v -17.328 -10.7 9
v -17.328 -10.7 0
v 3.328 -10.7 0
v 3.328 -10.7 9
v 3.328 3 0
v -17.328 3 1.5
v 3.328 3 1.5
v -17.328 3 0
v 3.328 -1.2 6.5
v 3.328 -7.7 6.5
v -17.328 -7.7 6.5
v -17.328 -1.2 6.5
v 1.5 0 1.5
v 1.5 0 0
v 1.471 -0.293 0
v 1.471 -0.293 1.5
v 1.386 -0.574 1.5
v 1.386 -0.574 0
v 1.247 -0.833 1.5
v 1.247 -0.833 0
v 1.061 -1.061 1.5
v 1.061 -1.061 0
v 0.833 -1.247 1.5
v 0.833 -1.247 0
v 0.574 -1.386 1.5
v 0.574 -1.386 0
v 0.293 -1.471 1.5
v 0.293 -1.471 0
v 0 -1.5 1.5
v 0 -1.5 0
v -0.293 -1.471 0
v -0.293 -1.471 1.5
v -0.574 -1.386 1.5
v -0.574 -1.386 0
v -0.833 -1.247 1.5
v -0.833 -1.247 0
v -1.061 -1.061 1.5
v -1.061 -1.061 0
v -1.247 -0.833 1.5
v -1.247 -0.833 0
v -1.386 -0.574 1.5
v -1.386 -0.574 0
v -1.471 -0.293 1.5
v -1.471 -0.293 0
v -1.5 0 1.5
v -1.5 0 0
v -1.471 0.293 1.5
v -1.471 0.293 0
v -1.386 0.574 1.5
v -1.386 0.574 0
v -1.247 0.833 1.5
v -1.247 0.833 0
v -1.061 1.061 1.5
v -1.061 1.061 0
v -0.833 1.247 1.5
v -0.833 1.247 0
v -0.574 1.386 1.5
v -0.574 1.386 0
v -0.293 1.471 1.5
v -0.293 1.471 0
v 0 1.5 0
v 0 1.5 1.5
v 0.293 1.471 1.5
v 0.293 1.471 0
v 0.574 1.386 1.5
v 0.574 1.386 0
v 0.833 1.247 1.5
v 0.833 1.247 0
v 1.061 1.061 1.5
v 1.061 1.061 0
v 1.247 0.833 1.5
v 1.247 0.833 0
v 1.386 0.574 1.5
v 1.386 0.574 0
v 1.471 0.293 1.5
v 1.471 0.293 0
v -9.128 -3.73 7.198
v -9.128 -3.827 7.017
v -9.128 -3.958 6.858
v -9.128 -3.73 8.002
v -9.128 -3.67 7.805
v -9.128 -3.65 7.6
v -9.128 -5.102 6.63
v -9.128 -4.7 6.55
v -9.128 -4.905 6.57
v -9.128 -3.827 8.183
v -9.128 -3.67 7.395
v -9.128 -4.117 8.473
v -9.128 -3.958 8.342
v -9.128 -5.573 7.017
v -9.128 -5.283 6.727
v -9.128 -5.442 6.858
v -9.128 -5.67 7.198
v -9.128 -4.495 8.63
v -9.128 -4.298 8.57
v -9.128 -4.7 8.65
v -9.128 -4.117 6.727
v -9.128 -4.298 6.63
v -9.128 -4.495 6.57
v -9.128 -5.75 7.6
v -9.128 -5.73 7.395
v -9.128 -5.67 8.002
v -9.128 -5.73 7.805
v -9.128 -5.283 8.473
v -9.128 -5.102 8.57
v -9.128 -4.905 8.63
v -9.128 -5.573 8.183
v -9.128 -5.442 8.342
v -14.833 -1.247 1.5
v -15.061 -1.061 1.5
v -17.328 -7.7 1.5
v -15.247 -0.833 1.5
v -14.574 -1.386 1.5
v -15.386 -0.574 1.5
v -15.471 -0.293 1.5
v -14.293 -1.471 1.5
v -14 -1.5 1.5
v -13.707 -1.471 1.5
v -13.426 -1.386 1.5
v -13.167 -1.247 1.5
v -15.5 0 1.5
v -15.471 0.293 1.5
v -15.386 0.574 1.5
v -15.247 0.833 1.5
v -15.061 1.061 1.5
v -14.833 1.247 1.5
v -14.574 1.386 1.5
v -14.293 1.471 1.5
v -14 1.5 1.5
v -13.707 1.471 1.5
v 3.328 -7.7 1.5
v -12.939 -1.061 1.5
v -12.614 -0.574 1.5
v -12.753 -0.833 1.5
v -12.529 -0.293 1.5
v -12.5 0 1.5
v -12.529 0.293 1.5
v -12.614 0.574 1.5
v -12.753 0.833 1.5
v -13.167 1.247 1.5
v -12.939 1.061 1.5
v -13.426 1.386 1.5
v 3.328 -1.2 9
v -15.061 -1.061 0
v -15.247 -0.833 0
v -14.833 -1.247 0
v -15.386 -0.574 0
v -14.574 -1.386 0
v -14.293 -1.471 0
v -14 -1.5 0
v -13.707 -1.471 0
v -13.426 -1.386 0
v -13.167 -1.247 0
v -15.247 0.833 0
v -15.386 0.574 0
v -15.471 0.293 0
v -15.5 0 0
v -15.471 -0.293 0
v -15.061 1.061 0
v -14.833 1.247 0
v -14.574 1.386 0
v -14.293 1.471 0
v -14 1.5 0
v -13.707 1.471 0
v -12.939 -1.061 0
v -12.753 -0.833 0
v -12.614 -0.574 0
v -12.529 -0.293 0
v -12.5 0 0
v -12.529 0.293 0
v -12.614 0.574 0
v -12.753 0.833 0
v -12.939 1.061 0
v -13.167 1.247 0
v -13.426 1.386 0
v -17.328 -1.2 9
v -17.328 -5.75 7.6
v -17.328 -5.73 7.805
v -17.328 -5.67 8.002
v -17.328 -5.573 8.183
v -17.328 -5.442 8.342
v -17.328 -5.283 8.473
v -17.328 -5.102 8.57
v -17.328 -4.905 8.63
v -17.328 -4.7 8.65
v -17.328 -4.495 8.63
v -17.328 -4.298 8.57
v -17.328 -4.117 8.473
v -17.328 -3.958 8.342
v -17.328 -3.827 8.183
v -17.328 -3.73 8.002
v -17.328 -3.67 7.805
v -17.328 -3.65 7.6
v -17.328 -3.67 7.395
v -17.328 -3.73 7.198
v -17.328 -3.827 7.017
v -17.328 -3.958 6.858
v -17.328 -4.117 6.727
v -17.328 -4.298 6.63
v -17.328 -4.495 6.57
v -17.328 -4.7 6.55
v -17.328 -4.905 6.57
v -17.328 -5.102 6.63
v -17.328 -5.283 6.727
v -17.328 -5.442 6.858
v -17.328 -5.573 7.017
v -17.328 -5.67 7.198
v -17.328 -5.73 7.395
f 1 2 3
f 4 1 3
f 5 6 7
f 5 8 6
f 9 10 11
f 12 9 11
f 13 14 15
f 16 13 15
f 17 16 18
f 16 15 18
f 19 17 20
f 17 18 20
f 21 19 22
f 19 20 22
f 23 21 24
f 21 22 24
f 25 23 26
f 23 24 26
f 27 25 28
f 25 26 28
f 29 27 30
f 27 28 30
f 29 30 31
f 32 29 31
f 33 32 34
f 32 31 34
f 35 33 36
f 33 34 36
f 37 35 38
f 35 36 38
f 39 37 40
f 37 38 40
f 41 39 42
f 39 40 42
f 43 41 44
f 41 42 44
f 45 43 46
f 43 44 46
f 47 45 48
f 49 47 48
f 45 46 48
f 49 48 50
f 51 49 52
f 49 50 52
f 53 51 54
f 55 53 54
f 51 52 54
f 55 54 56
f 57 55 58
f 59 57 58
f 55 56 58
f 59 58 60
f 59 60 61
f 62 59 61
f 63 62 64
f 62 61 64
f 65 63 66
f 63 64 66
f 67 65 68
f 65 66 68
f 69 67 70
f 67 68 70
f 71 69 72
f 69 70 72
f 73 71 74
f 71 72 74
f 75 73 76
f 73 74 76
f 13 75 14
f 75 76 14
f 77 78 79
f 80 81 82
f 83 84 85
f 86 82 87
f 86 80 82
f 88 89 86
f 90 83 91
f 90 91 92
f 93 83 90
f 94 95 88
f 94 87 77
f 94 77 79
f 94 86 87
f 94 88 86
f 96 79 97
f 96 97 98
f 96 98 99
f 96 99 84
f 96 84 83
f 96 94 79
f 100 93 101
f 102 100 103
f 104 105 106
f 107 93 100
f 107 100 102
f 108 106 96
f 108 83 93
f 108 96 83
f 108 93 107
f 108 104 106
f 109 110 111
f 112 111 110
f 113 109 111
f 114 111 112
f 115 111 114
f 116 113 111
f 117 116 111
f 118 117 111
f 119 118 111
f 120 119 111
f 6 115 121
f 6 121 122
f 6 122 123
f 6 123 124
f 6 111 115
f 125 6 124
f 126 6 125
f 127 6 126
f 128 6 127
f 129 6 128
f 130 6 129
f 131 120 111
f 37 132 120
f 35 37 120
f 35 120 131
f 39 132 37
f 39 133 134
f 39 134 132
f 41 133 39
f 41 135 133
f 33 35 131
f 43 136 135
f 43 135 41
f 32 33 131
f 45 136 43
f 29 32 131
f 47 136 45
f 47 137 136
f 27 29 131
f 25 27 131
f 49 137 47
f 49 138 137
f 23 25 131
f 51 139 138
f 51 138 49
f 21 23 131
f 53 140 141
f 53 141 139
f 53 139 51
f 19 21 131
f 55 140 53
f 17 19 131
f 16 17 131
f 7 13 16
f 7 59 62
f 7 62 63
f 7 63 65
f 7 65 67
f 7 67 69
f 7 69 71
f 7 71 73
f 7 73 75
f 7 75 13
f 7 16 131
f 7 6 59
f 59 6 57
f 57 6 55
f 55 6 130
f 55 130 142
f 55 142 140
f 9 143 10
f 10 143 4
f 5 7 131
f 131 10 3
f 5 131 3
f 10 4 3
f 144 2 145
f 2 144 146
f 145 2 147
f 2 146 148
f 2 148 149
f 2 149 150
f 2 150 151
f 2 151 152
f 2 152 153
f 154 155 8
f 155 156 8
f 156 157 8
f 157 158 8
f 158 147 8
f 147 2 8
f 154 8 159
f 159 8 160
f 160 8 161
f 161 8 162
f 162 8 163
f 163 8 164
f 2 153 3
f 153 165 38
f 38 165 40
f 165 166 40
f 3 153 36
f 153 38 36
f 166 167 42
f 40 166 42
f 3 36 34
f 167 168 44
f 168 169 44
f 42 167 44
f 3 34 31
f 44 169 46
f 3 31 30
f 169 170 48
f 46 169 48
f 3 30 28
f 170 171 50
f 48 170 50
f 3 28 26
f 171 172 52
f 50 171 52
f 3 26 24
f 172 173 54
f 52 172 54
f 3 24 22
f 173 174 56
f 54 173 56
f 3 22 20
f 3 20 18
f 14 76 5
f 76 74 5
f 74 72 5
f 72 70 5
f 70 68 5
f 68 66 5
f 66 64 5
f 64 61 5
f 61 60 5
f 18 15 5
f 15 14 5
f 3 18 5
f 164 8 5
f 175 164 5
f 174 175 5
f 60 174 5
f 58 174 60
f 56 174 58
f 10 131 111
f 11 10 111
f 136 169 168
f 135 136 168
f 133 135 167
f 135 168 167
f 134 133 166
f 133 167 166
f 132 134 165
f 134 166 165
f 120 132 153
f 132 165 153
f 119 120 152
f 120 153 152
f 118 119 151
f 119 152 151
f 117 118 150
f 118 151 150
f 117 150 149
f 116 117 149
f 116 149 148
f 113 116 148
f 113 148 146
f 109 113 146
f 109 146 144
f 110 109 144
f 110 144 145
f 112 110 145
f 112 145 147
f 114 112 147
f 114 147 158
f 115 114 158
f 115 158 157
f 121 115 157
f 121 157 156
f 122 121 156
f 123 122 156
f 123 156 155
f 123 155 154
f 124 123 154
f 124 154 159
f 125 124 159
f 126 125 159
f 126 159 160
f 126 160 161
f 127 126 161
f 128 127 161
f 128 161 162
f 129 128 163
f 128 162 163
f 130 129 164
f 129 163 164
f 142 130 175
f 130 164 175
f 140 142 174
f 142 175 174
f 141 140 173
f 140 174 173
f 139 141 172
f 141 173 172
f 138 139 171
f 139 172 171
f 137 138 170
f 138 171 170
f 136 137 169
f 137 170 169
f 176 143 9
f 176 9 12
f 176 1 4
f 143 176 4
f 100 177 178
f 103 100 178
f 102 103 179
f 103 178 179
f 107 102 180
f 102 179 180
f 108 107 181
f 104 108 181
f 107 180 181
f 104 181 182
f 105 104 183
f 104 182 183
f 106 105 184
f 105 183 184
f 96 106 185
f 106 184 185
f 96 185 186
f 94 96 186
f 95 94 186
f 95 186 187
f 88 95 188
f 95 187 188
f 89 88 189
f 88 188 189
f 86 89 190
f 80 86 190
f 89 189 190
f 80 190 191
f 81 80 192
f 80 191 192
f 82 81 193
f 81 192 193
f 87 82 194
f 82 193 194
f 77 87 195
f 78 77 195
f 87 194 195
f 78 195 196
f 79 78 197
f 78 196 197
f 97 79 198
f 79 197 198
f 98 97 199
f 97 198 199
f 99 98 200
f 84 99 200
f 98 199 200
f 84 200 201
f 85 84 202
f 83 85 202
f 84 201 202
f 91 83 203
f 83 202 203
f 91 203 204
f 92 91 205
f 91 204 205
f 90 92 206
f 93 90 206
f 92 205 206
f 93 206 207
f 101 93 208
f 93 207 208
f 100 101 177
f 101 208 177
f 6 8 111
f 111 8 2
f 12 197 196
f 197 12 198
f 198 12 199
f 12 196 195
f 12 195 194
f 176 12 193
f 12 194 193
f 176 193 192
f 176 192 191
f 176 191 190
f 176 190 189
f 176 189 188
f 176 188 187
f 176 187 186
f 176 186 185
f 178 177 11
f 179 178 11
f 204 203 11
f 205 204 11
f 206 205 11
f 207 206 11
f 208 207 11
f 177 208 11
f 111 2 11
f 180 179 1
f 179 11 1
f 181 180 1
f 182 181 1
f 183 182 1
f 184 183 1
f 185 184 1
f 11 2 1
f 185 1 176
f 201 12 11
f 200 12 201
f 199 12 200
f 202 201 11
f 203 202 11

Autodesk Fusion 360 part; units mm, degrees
sketch "草图1" plane through (0, 0, 0) normal (0, 0, 1) x (1, 0, 0)
  circle A0 centre (0, 0) radius 1.5
  circle A1 centre (-14, 0) radius 1.5
  line L0 (-14, 0) -> (0, 0) construction
  line L1 (-7, 0) -> (-7, -17.5669) construction
  dimension "d1" = 3
  dimension "d2" = 14
  dimension "d3" = 3
sketch "草图2" plane through (0, 0, 0) normal (0, 0, 1) x (1, 0, 0)
  line L0 (-17.3282, -10.7) -> (-17.3282, 3)
  line L1 (-17.3282, 3) -> (3.3282, 3)
  line L2 (3.3282, 3) -> (3.3282, -10.7)
  line L3 (-7, 0) -> (-7, -17.5669)
  line L4 (3.3282, -10.7) -> (-17.3282, -10.7)
  line L5 (-14, 0) -> (0, 0)
  dimension "d4" = 10.7
  dimension "d11" = 3
extrude "拉伸1" add sketch "草图2" along normal blind 1.5 in component "Component'"
extrude "拉伸2" cut sketch "草图1" along normal blind 4 in component "Component'"
sketch "草图4" plane through (0, 0, 1.5) normal (0, 0, 1) x (-1, 0, 0)
  circle A0 centre (14, 0) radius 1.5
  circle A1 centre (0, 0) radius 1.5
  line L0 (-3.3282, 10.7) -> (-3.3282, -3)
  line L1 (-3.3282, -3) -> (17.3282, -3)
  line L2 (17.3282, -3) -> (17.3282, 10.7)
  line L3 (17.3282, 10.7) -> (-3.3282, 10.7)
  line L4 (-3.3282, 10.7) -> (-3.3282, 7.7)
  line L5 (-3.3282, 7.7) -> (17.3282, 7.7)
  line L6 (17.3282, 10.7) -> (-3.3282, 10.7)
  dimension "d12" = 3
extrude "拉伸3" add sketch "草图4" along normal blind 7.5 contours L0 L2 L3 L4 L5 L6 in component "Component'"
sketch "草图5" plane through (0, -7.7, 0) normal (0, 1, 0) x (-1, 0, 0)
  line L0 (-3.3282, 1.5) -> (17.3282, 1.5)
  line L1 (17.3282, 1.5) -> (17.3282, 9)
  line L2 (17.3282, 9) -> (-3.3282, 9)
  line L3 (-3.3282, 9) -> (-3.3282, 1.5)
  line L4 (-3.3282, 6.5) -> (17.3282, 6.5)
  line L5 (17.3282, 9) -> (-3.3282, 9)
  dimension "d15" = 2.5
extrude "拉伸4" add sketch "草图5" along normal blind 6.5 contours L1 L2 L3 L4 L5 in component "Component'"
sketch "草图6" plane through (-17.3282, 0, 0) normal (-1, 0, 0) x (0, -1, 0)
  line L0 (-3, 0) -> (10.7, 0)
  line L1 (10.7, 0) -> (10.7, 9)
  line L2 (10.7, 9) -> (1.2, 9)
  line L3 (1.2, 9) -> (1.2, 6.5)
  line L4 (1.2, 6.5) -> (7.7, 6.5)
  line L5 (7.7, 6.5) -> (7.7, 1.5)
  line L6 (7.7, 1.5) -> (-3, 1.5)
  line L7 (-3, 1.5) -> (-3, 0)
  circle A0 centre (4.7, 7.6) radius 1.05
  point P0 (4.7, 7.6)
  dimension "d18" = 3
  dimension "d19" = 6.1
  dimension "d20" = 2.1
extrude "拉伸5" cut sketch "草图6" against normal blind 8.2 contours A0 in component "Component'"
component "Component'" placed x (1, 0, 0) y (0, 1, 0) z (0, 0, 1) at (0, 0, 0)
